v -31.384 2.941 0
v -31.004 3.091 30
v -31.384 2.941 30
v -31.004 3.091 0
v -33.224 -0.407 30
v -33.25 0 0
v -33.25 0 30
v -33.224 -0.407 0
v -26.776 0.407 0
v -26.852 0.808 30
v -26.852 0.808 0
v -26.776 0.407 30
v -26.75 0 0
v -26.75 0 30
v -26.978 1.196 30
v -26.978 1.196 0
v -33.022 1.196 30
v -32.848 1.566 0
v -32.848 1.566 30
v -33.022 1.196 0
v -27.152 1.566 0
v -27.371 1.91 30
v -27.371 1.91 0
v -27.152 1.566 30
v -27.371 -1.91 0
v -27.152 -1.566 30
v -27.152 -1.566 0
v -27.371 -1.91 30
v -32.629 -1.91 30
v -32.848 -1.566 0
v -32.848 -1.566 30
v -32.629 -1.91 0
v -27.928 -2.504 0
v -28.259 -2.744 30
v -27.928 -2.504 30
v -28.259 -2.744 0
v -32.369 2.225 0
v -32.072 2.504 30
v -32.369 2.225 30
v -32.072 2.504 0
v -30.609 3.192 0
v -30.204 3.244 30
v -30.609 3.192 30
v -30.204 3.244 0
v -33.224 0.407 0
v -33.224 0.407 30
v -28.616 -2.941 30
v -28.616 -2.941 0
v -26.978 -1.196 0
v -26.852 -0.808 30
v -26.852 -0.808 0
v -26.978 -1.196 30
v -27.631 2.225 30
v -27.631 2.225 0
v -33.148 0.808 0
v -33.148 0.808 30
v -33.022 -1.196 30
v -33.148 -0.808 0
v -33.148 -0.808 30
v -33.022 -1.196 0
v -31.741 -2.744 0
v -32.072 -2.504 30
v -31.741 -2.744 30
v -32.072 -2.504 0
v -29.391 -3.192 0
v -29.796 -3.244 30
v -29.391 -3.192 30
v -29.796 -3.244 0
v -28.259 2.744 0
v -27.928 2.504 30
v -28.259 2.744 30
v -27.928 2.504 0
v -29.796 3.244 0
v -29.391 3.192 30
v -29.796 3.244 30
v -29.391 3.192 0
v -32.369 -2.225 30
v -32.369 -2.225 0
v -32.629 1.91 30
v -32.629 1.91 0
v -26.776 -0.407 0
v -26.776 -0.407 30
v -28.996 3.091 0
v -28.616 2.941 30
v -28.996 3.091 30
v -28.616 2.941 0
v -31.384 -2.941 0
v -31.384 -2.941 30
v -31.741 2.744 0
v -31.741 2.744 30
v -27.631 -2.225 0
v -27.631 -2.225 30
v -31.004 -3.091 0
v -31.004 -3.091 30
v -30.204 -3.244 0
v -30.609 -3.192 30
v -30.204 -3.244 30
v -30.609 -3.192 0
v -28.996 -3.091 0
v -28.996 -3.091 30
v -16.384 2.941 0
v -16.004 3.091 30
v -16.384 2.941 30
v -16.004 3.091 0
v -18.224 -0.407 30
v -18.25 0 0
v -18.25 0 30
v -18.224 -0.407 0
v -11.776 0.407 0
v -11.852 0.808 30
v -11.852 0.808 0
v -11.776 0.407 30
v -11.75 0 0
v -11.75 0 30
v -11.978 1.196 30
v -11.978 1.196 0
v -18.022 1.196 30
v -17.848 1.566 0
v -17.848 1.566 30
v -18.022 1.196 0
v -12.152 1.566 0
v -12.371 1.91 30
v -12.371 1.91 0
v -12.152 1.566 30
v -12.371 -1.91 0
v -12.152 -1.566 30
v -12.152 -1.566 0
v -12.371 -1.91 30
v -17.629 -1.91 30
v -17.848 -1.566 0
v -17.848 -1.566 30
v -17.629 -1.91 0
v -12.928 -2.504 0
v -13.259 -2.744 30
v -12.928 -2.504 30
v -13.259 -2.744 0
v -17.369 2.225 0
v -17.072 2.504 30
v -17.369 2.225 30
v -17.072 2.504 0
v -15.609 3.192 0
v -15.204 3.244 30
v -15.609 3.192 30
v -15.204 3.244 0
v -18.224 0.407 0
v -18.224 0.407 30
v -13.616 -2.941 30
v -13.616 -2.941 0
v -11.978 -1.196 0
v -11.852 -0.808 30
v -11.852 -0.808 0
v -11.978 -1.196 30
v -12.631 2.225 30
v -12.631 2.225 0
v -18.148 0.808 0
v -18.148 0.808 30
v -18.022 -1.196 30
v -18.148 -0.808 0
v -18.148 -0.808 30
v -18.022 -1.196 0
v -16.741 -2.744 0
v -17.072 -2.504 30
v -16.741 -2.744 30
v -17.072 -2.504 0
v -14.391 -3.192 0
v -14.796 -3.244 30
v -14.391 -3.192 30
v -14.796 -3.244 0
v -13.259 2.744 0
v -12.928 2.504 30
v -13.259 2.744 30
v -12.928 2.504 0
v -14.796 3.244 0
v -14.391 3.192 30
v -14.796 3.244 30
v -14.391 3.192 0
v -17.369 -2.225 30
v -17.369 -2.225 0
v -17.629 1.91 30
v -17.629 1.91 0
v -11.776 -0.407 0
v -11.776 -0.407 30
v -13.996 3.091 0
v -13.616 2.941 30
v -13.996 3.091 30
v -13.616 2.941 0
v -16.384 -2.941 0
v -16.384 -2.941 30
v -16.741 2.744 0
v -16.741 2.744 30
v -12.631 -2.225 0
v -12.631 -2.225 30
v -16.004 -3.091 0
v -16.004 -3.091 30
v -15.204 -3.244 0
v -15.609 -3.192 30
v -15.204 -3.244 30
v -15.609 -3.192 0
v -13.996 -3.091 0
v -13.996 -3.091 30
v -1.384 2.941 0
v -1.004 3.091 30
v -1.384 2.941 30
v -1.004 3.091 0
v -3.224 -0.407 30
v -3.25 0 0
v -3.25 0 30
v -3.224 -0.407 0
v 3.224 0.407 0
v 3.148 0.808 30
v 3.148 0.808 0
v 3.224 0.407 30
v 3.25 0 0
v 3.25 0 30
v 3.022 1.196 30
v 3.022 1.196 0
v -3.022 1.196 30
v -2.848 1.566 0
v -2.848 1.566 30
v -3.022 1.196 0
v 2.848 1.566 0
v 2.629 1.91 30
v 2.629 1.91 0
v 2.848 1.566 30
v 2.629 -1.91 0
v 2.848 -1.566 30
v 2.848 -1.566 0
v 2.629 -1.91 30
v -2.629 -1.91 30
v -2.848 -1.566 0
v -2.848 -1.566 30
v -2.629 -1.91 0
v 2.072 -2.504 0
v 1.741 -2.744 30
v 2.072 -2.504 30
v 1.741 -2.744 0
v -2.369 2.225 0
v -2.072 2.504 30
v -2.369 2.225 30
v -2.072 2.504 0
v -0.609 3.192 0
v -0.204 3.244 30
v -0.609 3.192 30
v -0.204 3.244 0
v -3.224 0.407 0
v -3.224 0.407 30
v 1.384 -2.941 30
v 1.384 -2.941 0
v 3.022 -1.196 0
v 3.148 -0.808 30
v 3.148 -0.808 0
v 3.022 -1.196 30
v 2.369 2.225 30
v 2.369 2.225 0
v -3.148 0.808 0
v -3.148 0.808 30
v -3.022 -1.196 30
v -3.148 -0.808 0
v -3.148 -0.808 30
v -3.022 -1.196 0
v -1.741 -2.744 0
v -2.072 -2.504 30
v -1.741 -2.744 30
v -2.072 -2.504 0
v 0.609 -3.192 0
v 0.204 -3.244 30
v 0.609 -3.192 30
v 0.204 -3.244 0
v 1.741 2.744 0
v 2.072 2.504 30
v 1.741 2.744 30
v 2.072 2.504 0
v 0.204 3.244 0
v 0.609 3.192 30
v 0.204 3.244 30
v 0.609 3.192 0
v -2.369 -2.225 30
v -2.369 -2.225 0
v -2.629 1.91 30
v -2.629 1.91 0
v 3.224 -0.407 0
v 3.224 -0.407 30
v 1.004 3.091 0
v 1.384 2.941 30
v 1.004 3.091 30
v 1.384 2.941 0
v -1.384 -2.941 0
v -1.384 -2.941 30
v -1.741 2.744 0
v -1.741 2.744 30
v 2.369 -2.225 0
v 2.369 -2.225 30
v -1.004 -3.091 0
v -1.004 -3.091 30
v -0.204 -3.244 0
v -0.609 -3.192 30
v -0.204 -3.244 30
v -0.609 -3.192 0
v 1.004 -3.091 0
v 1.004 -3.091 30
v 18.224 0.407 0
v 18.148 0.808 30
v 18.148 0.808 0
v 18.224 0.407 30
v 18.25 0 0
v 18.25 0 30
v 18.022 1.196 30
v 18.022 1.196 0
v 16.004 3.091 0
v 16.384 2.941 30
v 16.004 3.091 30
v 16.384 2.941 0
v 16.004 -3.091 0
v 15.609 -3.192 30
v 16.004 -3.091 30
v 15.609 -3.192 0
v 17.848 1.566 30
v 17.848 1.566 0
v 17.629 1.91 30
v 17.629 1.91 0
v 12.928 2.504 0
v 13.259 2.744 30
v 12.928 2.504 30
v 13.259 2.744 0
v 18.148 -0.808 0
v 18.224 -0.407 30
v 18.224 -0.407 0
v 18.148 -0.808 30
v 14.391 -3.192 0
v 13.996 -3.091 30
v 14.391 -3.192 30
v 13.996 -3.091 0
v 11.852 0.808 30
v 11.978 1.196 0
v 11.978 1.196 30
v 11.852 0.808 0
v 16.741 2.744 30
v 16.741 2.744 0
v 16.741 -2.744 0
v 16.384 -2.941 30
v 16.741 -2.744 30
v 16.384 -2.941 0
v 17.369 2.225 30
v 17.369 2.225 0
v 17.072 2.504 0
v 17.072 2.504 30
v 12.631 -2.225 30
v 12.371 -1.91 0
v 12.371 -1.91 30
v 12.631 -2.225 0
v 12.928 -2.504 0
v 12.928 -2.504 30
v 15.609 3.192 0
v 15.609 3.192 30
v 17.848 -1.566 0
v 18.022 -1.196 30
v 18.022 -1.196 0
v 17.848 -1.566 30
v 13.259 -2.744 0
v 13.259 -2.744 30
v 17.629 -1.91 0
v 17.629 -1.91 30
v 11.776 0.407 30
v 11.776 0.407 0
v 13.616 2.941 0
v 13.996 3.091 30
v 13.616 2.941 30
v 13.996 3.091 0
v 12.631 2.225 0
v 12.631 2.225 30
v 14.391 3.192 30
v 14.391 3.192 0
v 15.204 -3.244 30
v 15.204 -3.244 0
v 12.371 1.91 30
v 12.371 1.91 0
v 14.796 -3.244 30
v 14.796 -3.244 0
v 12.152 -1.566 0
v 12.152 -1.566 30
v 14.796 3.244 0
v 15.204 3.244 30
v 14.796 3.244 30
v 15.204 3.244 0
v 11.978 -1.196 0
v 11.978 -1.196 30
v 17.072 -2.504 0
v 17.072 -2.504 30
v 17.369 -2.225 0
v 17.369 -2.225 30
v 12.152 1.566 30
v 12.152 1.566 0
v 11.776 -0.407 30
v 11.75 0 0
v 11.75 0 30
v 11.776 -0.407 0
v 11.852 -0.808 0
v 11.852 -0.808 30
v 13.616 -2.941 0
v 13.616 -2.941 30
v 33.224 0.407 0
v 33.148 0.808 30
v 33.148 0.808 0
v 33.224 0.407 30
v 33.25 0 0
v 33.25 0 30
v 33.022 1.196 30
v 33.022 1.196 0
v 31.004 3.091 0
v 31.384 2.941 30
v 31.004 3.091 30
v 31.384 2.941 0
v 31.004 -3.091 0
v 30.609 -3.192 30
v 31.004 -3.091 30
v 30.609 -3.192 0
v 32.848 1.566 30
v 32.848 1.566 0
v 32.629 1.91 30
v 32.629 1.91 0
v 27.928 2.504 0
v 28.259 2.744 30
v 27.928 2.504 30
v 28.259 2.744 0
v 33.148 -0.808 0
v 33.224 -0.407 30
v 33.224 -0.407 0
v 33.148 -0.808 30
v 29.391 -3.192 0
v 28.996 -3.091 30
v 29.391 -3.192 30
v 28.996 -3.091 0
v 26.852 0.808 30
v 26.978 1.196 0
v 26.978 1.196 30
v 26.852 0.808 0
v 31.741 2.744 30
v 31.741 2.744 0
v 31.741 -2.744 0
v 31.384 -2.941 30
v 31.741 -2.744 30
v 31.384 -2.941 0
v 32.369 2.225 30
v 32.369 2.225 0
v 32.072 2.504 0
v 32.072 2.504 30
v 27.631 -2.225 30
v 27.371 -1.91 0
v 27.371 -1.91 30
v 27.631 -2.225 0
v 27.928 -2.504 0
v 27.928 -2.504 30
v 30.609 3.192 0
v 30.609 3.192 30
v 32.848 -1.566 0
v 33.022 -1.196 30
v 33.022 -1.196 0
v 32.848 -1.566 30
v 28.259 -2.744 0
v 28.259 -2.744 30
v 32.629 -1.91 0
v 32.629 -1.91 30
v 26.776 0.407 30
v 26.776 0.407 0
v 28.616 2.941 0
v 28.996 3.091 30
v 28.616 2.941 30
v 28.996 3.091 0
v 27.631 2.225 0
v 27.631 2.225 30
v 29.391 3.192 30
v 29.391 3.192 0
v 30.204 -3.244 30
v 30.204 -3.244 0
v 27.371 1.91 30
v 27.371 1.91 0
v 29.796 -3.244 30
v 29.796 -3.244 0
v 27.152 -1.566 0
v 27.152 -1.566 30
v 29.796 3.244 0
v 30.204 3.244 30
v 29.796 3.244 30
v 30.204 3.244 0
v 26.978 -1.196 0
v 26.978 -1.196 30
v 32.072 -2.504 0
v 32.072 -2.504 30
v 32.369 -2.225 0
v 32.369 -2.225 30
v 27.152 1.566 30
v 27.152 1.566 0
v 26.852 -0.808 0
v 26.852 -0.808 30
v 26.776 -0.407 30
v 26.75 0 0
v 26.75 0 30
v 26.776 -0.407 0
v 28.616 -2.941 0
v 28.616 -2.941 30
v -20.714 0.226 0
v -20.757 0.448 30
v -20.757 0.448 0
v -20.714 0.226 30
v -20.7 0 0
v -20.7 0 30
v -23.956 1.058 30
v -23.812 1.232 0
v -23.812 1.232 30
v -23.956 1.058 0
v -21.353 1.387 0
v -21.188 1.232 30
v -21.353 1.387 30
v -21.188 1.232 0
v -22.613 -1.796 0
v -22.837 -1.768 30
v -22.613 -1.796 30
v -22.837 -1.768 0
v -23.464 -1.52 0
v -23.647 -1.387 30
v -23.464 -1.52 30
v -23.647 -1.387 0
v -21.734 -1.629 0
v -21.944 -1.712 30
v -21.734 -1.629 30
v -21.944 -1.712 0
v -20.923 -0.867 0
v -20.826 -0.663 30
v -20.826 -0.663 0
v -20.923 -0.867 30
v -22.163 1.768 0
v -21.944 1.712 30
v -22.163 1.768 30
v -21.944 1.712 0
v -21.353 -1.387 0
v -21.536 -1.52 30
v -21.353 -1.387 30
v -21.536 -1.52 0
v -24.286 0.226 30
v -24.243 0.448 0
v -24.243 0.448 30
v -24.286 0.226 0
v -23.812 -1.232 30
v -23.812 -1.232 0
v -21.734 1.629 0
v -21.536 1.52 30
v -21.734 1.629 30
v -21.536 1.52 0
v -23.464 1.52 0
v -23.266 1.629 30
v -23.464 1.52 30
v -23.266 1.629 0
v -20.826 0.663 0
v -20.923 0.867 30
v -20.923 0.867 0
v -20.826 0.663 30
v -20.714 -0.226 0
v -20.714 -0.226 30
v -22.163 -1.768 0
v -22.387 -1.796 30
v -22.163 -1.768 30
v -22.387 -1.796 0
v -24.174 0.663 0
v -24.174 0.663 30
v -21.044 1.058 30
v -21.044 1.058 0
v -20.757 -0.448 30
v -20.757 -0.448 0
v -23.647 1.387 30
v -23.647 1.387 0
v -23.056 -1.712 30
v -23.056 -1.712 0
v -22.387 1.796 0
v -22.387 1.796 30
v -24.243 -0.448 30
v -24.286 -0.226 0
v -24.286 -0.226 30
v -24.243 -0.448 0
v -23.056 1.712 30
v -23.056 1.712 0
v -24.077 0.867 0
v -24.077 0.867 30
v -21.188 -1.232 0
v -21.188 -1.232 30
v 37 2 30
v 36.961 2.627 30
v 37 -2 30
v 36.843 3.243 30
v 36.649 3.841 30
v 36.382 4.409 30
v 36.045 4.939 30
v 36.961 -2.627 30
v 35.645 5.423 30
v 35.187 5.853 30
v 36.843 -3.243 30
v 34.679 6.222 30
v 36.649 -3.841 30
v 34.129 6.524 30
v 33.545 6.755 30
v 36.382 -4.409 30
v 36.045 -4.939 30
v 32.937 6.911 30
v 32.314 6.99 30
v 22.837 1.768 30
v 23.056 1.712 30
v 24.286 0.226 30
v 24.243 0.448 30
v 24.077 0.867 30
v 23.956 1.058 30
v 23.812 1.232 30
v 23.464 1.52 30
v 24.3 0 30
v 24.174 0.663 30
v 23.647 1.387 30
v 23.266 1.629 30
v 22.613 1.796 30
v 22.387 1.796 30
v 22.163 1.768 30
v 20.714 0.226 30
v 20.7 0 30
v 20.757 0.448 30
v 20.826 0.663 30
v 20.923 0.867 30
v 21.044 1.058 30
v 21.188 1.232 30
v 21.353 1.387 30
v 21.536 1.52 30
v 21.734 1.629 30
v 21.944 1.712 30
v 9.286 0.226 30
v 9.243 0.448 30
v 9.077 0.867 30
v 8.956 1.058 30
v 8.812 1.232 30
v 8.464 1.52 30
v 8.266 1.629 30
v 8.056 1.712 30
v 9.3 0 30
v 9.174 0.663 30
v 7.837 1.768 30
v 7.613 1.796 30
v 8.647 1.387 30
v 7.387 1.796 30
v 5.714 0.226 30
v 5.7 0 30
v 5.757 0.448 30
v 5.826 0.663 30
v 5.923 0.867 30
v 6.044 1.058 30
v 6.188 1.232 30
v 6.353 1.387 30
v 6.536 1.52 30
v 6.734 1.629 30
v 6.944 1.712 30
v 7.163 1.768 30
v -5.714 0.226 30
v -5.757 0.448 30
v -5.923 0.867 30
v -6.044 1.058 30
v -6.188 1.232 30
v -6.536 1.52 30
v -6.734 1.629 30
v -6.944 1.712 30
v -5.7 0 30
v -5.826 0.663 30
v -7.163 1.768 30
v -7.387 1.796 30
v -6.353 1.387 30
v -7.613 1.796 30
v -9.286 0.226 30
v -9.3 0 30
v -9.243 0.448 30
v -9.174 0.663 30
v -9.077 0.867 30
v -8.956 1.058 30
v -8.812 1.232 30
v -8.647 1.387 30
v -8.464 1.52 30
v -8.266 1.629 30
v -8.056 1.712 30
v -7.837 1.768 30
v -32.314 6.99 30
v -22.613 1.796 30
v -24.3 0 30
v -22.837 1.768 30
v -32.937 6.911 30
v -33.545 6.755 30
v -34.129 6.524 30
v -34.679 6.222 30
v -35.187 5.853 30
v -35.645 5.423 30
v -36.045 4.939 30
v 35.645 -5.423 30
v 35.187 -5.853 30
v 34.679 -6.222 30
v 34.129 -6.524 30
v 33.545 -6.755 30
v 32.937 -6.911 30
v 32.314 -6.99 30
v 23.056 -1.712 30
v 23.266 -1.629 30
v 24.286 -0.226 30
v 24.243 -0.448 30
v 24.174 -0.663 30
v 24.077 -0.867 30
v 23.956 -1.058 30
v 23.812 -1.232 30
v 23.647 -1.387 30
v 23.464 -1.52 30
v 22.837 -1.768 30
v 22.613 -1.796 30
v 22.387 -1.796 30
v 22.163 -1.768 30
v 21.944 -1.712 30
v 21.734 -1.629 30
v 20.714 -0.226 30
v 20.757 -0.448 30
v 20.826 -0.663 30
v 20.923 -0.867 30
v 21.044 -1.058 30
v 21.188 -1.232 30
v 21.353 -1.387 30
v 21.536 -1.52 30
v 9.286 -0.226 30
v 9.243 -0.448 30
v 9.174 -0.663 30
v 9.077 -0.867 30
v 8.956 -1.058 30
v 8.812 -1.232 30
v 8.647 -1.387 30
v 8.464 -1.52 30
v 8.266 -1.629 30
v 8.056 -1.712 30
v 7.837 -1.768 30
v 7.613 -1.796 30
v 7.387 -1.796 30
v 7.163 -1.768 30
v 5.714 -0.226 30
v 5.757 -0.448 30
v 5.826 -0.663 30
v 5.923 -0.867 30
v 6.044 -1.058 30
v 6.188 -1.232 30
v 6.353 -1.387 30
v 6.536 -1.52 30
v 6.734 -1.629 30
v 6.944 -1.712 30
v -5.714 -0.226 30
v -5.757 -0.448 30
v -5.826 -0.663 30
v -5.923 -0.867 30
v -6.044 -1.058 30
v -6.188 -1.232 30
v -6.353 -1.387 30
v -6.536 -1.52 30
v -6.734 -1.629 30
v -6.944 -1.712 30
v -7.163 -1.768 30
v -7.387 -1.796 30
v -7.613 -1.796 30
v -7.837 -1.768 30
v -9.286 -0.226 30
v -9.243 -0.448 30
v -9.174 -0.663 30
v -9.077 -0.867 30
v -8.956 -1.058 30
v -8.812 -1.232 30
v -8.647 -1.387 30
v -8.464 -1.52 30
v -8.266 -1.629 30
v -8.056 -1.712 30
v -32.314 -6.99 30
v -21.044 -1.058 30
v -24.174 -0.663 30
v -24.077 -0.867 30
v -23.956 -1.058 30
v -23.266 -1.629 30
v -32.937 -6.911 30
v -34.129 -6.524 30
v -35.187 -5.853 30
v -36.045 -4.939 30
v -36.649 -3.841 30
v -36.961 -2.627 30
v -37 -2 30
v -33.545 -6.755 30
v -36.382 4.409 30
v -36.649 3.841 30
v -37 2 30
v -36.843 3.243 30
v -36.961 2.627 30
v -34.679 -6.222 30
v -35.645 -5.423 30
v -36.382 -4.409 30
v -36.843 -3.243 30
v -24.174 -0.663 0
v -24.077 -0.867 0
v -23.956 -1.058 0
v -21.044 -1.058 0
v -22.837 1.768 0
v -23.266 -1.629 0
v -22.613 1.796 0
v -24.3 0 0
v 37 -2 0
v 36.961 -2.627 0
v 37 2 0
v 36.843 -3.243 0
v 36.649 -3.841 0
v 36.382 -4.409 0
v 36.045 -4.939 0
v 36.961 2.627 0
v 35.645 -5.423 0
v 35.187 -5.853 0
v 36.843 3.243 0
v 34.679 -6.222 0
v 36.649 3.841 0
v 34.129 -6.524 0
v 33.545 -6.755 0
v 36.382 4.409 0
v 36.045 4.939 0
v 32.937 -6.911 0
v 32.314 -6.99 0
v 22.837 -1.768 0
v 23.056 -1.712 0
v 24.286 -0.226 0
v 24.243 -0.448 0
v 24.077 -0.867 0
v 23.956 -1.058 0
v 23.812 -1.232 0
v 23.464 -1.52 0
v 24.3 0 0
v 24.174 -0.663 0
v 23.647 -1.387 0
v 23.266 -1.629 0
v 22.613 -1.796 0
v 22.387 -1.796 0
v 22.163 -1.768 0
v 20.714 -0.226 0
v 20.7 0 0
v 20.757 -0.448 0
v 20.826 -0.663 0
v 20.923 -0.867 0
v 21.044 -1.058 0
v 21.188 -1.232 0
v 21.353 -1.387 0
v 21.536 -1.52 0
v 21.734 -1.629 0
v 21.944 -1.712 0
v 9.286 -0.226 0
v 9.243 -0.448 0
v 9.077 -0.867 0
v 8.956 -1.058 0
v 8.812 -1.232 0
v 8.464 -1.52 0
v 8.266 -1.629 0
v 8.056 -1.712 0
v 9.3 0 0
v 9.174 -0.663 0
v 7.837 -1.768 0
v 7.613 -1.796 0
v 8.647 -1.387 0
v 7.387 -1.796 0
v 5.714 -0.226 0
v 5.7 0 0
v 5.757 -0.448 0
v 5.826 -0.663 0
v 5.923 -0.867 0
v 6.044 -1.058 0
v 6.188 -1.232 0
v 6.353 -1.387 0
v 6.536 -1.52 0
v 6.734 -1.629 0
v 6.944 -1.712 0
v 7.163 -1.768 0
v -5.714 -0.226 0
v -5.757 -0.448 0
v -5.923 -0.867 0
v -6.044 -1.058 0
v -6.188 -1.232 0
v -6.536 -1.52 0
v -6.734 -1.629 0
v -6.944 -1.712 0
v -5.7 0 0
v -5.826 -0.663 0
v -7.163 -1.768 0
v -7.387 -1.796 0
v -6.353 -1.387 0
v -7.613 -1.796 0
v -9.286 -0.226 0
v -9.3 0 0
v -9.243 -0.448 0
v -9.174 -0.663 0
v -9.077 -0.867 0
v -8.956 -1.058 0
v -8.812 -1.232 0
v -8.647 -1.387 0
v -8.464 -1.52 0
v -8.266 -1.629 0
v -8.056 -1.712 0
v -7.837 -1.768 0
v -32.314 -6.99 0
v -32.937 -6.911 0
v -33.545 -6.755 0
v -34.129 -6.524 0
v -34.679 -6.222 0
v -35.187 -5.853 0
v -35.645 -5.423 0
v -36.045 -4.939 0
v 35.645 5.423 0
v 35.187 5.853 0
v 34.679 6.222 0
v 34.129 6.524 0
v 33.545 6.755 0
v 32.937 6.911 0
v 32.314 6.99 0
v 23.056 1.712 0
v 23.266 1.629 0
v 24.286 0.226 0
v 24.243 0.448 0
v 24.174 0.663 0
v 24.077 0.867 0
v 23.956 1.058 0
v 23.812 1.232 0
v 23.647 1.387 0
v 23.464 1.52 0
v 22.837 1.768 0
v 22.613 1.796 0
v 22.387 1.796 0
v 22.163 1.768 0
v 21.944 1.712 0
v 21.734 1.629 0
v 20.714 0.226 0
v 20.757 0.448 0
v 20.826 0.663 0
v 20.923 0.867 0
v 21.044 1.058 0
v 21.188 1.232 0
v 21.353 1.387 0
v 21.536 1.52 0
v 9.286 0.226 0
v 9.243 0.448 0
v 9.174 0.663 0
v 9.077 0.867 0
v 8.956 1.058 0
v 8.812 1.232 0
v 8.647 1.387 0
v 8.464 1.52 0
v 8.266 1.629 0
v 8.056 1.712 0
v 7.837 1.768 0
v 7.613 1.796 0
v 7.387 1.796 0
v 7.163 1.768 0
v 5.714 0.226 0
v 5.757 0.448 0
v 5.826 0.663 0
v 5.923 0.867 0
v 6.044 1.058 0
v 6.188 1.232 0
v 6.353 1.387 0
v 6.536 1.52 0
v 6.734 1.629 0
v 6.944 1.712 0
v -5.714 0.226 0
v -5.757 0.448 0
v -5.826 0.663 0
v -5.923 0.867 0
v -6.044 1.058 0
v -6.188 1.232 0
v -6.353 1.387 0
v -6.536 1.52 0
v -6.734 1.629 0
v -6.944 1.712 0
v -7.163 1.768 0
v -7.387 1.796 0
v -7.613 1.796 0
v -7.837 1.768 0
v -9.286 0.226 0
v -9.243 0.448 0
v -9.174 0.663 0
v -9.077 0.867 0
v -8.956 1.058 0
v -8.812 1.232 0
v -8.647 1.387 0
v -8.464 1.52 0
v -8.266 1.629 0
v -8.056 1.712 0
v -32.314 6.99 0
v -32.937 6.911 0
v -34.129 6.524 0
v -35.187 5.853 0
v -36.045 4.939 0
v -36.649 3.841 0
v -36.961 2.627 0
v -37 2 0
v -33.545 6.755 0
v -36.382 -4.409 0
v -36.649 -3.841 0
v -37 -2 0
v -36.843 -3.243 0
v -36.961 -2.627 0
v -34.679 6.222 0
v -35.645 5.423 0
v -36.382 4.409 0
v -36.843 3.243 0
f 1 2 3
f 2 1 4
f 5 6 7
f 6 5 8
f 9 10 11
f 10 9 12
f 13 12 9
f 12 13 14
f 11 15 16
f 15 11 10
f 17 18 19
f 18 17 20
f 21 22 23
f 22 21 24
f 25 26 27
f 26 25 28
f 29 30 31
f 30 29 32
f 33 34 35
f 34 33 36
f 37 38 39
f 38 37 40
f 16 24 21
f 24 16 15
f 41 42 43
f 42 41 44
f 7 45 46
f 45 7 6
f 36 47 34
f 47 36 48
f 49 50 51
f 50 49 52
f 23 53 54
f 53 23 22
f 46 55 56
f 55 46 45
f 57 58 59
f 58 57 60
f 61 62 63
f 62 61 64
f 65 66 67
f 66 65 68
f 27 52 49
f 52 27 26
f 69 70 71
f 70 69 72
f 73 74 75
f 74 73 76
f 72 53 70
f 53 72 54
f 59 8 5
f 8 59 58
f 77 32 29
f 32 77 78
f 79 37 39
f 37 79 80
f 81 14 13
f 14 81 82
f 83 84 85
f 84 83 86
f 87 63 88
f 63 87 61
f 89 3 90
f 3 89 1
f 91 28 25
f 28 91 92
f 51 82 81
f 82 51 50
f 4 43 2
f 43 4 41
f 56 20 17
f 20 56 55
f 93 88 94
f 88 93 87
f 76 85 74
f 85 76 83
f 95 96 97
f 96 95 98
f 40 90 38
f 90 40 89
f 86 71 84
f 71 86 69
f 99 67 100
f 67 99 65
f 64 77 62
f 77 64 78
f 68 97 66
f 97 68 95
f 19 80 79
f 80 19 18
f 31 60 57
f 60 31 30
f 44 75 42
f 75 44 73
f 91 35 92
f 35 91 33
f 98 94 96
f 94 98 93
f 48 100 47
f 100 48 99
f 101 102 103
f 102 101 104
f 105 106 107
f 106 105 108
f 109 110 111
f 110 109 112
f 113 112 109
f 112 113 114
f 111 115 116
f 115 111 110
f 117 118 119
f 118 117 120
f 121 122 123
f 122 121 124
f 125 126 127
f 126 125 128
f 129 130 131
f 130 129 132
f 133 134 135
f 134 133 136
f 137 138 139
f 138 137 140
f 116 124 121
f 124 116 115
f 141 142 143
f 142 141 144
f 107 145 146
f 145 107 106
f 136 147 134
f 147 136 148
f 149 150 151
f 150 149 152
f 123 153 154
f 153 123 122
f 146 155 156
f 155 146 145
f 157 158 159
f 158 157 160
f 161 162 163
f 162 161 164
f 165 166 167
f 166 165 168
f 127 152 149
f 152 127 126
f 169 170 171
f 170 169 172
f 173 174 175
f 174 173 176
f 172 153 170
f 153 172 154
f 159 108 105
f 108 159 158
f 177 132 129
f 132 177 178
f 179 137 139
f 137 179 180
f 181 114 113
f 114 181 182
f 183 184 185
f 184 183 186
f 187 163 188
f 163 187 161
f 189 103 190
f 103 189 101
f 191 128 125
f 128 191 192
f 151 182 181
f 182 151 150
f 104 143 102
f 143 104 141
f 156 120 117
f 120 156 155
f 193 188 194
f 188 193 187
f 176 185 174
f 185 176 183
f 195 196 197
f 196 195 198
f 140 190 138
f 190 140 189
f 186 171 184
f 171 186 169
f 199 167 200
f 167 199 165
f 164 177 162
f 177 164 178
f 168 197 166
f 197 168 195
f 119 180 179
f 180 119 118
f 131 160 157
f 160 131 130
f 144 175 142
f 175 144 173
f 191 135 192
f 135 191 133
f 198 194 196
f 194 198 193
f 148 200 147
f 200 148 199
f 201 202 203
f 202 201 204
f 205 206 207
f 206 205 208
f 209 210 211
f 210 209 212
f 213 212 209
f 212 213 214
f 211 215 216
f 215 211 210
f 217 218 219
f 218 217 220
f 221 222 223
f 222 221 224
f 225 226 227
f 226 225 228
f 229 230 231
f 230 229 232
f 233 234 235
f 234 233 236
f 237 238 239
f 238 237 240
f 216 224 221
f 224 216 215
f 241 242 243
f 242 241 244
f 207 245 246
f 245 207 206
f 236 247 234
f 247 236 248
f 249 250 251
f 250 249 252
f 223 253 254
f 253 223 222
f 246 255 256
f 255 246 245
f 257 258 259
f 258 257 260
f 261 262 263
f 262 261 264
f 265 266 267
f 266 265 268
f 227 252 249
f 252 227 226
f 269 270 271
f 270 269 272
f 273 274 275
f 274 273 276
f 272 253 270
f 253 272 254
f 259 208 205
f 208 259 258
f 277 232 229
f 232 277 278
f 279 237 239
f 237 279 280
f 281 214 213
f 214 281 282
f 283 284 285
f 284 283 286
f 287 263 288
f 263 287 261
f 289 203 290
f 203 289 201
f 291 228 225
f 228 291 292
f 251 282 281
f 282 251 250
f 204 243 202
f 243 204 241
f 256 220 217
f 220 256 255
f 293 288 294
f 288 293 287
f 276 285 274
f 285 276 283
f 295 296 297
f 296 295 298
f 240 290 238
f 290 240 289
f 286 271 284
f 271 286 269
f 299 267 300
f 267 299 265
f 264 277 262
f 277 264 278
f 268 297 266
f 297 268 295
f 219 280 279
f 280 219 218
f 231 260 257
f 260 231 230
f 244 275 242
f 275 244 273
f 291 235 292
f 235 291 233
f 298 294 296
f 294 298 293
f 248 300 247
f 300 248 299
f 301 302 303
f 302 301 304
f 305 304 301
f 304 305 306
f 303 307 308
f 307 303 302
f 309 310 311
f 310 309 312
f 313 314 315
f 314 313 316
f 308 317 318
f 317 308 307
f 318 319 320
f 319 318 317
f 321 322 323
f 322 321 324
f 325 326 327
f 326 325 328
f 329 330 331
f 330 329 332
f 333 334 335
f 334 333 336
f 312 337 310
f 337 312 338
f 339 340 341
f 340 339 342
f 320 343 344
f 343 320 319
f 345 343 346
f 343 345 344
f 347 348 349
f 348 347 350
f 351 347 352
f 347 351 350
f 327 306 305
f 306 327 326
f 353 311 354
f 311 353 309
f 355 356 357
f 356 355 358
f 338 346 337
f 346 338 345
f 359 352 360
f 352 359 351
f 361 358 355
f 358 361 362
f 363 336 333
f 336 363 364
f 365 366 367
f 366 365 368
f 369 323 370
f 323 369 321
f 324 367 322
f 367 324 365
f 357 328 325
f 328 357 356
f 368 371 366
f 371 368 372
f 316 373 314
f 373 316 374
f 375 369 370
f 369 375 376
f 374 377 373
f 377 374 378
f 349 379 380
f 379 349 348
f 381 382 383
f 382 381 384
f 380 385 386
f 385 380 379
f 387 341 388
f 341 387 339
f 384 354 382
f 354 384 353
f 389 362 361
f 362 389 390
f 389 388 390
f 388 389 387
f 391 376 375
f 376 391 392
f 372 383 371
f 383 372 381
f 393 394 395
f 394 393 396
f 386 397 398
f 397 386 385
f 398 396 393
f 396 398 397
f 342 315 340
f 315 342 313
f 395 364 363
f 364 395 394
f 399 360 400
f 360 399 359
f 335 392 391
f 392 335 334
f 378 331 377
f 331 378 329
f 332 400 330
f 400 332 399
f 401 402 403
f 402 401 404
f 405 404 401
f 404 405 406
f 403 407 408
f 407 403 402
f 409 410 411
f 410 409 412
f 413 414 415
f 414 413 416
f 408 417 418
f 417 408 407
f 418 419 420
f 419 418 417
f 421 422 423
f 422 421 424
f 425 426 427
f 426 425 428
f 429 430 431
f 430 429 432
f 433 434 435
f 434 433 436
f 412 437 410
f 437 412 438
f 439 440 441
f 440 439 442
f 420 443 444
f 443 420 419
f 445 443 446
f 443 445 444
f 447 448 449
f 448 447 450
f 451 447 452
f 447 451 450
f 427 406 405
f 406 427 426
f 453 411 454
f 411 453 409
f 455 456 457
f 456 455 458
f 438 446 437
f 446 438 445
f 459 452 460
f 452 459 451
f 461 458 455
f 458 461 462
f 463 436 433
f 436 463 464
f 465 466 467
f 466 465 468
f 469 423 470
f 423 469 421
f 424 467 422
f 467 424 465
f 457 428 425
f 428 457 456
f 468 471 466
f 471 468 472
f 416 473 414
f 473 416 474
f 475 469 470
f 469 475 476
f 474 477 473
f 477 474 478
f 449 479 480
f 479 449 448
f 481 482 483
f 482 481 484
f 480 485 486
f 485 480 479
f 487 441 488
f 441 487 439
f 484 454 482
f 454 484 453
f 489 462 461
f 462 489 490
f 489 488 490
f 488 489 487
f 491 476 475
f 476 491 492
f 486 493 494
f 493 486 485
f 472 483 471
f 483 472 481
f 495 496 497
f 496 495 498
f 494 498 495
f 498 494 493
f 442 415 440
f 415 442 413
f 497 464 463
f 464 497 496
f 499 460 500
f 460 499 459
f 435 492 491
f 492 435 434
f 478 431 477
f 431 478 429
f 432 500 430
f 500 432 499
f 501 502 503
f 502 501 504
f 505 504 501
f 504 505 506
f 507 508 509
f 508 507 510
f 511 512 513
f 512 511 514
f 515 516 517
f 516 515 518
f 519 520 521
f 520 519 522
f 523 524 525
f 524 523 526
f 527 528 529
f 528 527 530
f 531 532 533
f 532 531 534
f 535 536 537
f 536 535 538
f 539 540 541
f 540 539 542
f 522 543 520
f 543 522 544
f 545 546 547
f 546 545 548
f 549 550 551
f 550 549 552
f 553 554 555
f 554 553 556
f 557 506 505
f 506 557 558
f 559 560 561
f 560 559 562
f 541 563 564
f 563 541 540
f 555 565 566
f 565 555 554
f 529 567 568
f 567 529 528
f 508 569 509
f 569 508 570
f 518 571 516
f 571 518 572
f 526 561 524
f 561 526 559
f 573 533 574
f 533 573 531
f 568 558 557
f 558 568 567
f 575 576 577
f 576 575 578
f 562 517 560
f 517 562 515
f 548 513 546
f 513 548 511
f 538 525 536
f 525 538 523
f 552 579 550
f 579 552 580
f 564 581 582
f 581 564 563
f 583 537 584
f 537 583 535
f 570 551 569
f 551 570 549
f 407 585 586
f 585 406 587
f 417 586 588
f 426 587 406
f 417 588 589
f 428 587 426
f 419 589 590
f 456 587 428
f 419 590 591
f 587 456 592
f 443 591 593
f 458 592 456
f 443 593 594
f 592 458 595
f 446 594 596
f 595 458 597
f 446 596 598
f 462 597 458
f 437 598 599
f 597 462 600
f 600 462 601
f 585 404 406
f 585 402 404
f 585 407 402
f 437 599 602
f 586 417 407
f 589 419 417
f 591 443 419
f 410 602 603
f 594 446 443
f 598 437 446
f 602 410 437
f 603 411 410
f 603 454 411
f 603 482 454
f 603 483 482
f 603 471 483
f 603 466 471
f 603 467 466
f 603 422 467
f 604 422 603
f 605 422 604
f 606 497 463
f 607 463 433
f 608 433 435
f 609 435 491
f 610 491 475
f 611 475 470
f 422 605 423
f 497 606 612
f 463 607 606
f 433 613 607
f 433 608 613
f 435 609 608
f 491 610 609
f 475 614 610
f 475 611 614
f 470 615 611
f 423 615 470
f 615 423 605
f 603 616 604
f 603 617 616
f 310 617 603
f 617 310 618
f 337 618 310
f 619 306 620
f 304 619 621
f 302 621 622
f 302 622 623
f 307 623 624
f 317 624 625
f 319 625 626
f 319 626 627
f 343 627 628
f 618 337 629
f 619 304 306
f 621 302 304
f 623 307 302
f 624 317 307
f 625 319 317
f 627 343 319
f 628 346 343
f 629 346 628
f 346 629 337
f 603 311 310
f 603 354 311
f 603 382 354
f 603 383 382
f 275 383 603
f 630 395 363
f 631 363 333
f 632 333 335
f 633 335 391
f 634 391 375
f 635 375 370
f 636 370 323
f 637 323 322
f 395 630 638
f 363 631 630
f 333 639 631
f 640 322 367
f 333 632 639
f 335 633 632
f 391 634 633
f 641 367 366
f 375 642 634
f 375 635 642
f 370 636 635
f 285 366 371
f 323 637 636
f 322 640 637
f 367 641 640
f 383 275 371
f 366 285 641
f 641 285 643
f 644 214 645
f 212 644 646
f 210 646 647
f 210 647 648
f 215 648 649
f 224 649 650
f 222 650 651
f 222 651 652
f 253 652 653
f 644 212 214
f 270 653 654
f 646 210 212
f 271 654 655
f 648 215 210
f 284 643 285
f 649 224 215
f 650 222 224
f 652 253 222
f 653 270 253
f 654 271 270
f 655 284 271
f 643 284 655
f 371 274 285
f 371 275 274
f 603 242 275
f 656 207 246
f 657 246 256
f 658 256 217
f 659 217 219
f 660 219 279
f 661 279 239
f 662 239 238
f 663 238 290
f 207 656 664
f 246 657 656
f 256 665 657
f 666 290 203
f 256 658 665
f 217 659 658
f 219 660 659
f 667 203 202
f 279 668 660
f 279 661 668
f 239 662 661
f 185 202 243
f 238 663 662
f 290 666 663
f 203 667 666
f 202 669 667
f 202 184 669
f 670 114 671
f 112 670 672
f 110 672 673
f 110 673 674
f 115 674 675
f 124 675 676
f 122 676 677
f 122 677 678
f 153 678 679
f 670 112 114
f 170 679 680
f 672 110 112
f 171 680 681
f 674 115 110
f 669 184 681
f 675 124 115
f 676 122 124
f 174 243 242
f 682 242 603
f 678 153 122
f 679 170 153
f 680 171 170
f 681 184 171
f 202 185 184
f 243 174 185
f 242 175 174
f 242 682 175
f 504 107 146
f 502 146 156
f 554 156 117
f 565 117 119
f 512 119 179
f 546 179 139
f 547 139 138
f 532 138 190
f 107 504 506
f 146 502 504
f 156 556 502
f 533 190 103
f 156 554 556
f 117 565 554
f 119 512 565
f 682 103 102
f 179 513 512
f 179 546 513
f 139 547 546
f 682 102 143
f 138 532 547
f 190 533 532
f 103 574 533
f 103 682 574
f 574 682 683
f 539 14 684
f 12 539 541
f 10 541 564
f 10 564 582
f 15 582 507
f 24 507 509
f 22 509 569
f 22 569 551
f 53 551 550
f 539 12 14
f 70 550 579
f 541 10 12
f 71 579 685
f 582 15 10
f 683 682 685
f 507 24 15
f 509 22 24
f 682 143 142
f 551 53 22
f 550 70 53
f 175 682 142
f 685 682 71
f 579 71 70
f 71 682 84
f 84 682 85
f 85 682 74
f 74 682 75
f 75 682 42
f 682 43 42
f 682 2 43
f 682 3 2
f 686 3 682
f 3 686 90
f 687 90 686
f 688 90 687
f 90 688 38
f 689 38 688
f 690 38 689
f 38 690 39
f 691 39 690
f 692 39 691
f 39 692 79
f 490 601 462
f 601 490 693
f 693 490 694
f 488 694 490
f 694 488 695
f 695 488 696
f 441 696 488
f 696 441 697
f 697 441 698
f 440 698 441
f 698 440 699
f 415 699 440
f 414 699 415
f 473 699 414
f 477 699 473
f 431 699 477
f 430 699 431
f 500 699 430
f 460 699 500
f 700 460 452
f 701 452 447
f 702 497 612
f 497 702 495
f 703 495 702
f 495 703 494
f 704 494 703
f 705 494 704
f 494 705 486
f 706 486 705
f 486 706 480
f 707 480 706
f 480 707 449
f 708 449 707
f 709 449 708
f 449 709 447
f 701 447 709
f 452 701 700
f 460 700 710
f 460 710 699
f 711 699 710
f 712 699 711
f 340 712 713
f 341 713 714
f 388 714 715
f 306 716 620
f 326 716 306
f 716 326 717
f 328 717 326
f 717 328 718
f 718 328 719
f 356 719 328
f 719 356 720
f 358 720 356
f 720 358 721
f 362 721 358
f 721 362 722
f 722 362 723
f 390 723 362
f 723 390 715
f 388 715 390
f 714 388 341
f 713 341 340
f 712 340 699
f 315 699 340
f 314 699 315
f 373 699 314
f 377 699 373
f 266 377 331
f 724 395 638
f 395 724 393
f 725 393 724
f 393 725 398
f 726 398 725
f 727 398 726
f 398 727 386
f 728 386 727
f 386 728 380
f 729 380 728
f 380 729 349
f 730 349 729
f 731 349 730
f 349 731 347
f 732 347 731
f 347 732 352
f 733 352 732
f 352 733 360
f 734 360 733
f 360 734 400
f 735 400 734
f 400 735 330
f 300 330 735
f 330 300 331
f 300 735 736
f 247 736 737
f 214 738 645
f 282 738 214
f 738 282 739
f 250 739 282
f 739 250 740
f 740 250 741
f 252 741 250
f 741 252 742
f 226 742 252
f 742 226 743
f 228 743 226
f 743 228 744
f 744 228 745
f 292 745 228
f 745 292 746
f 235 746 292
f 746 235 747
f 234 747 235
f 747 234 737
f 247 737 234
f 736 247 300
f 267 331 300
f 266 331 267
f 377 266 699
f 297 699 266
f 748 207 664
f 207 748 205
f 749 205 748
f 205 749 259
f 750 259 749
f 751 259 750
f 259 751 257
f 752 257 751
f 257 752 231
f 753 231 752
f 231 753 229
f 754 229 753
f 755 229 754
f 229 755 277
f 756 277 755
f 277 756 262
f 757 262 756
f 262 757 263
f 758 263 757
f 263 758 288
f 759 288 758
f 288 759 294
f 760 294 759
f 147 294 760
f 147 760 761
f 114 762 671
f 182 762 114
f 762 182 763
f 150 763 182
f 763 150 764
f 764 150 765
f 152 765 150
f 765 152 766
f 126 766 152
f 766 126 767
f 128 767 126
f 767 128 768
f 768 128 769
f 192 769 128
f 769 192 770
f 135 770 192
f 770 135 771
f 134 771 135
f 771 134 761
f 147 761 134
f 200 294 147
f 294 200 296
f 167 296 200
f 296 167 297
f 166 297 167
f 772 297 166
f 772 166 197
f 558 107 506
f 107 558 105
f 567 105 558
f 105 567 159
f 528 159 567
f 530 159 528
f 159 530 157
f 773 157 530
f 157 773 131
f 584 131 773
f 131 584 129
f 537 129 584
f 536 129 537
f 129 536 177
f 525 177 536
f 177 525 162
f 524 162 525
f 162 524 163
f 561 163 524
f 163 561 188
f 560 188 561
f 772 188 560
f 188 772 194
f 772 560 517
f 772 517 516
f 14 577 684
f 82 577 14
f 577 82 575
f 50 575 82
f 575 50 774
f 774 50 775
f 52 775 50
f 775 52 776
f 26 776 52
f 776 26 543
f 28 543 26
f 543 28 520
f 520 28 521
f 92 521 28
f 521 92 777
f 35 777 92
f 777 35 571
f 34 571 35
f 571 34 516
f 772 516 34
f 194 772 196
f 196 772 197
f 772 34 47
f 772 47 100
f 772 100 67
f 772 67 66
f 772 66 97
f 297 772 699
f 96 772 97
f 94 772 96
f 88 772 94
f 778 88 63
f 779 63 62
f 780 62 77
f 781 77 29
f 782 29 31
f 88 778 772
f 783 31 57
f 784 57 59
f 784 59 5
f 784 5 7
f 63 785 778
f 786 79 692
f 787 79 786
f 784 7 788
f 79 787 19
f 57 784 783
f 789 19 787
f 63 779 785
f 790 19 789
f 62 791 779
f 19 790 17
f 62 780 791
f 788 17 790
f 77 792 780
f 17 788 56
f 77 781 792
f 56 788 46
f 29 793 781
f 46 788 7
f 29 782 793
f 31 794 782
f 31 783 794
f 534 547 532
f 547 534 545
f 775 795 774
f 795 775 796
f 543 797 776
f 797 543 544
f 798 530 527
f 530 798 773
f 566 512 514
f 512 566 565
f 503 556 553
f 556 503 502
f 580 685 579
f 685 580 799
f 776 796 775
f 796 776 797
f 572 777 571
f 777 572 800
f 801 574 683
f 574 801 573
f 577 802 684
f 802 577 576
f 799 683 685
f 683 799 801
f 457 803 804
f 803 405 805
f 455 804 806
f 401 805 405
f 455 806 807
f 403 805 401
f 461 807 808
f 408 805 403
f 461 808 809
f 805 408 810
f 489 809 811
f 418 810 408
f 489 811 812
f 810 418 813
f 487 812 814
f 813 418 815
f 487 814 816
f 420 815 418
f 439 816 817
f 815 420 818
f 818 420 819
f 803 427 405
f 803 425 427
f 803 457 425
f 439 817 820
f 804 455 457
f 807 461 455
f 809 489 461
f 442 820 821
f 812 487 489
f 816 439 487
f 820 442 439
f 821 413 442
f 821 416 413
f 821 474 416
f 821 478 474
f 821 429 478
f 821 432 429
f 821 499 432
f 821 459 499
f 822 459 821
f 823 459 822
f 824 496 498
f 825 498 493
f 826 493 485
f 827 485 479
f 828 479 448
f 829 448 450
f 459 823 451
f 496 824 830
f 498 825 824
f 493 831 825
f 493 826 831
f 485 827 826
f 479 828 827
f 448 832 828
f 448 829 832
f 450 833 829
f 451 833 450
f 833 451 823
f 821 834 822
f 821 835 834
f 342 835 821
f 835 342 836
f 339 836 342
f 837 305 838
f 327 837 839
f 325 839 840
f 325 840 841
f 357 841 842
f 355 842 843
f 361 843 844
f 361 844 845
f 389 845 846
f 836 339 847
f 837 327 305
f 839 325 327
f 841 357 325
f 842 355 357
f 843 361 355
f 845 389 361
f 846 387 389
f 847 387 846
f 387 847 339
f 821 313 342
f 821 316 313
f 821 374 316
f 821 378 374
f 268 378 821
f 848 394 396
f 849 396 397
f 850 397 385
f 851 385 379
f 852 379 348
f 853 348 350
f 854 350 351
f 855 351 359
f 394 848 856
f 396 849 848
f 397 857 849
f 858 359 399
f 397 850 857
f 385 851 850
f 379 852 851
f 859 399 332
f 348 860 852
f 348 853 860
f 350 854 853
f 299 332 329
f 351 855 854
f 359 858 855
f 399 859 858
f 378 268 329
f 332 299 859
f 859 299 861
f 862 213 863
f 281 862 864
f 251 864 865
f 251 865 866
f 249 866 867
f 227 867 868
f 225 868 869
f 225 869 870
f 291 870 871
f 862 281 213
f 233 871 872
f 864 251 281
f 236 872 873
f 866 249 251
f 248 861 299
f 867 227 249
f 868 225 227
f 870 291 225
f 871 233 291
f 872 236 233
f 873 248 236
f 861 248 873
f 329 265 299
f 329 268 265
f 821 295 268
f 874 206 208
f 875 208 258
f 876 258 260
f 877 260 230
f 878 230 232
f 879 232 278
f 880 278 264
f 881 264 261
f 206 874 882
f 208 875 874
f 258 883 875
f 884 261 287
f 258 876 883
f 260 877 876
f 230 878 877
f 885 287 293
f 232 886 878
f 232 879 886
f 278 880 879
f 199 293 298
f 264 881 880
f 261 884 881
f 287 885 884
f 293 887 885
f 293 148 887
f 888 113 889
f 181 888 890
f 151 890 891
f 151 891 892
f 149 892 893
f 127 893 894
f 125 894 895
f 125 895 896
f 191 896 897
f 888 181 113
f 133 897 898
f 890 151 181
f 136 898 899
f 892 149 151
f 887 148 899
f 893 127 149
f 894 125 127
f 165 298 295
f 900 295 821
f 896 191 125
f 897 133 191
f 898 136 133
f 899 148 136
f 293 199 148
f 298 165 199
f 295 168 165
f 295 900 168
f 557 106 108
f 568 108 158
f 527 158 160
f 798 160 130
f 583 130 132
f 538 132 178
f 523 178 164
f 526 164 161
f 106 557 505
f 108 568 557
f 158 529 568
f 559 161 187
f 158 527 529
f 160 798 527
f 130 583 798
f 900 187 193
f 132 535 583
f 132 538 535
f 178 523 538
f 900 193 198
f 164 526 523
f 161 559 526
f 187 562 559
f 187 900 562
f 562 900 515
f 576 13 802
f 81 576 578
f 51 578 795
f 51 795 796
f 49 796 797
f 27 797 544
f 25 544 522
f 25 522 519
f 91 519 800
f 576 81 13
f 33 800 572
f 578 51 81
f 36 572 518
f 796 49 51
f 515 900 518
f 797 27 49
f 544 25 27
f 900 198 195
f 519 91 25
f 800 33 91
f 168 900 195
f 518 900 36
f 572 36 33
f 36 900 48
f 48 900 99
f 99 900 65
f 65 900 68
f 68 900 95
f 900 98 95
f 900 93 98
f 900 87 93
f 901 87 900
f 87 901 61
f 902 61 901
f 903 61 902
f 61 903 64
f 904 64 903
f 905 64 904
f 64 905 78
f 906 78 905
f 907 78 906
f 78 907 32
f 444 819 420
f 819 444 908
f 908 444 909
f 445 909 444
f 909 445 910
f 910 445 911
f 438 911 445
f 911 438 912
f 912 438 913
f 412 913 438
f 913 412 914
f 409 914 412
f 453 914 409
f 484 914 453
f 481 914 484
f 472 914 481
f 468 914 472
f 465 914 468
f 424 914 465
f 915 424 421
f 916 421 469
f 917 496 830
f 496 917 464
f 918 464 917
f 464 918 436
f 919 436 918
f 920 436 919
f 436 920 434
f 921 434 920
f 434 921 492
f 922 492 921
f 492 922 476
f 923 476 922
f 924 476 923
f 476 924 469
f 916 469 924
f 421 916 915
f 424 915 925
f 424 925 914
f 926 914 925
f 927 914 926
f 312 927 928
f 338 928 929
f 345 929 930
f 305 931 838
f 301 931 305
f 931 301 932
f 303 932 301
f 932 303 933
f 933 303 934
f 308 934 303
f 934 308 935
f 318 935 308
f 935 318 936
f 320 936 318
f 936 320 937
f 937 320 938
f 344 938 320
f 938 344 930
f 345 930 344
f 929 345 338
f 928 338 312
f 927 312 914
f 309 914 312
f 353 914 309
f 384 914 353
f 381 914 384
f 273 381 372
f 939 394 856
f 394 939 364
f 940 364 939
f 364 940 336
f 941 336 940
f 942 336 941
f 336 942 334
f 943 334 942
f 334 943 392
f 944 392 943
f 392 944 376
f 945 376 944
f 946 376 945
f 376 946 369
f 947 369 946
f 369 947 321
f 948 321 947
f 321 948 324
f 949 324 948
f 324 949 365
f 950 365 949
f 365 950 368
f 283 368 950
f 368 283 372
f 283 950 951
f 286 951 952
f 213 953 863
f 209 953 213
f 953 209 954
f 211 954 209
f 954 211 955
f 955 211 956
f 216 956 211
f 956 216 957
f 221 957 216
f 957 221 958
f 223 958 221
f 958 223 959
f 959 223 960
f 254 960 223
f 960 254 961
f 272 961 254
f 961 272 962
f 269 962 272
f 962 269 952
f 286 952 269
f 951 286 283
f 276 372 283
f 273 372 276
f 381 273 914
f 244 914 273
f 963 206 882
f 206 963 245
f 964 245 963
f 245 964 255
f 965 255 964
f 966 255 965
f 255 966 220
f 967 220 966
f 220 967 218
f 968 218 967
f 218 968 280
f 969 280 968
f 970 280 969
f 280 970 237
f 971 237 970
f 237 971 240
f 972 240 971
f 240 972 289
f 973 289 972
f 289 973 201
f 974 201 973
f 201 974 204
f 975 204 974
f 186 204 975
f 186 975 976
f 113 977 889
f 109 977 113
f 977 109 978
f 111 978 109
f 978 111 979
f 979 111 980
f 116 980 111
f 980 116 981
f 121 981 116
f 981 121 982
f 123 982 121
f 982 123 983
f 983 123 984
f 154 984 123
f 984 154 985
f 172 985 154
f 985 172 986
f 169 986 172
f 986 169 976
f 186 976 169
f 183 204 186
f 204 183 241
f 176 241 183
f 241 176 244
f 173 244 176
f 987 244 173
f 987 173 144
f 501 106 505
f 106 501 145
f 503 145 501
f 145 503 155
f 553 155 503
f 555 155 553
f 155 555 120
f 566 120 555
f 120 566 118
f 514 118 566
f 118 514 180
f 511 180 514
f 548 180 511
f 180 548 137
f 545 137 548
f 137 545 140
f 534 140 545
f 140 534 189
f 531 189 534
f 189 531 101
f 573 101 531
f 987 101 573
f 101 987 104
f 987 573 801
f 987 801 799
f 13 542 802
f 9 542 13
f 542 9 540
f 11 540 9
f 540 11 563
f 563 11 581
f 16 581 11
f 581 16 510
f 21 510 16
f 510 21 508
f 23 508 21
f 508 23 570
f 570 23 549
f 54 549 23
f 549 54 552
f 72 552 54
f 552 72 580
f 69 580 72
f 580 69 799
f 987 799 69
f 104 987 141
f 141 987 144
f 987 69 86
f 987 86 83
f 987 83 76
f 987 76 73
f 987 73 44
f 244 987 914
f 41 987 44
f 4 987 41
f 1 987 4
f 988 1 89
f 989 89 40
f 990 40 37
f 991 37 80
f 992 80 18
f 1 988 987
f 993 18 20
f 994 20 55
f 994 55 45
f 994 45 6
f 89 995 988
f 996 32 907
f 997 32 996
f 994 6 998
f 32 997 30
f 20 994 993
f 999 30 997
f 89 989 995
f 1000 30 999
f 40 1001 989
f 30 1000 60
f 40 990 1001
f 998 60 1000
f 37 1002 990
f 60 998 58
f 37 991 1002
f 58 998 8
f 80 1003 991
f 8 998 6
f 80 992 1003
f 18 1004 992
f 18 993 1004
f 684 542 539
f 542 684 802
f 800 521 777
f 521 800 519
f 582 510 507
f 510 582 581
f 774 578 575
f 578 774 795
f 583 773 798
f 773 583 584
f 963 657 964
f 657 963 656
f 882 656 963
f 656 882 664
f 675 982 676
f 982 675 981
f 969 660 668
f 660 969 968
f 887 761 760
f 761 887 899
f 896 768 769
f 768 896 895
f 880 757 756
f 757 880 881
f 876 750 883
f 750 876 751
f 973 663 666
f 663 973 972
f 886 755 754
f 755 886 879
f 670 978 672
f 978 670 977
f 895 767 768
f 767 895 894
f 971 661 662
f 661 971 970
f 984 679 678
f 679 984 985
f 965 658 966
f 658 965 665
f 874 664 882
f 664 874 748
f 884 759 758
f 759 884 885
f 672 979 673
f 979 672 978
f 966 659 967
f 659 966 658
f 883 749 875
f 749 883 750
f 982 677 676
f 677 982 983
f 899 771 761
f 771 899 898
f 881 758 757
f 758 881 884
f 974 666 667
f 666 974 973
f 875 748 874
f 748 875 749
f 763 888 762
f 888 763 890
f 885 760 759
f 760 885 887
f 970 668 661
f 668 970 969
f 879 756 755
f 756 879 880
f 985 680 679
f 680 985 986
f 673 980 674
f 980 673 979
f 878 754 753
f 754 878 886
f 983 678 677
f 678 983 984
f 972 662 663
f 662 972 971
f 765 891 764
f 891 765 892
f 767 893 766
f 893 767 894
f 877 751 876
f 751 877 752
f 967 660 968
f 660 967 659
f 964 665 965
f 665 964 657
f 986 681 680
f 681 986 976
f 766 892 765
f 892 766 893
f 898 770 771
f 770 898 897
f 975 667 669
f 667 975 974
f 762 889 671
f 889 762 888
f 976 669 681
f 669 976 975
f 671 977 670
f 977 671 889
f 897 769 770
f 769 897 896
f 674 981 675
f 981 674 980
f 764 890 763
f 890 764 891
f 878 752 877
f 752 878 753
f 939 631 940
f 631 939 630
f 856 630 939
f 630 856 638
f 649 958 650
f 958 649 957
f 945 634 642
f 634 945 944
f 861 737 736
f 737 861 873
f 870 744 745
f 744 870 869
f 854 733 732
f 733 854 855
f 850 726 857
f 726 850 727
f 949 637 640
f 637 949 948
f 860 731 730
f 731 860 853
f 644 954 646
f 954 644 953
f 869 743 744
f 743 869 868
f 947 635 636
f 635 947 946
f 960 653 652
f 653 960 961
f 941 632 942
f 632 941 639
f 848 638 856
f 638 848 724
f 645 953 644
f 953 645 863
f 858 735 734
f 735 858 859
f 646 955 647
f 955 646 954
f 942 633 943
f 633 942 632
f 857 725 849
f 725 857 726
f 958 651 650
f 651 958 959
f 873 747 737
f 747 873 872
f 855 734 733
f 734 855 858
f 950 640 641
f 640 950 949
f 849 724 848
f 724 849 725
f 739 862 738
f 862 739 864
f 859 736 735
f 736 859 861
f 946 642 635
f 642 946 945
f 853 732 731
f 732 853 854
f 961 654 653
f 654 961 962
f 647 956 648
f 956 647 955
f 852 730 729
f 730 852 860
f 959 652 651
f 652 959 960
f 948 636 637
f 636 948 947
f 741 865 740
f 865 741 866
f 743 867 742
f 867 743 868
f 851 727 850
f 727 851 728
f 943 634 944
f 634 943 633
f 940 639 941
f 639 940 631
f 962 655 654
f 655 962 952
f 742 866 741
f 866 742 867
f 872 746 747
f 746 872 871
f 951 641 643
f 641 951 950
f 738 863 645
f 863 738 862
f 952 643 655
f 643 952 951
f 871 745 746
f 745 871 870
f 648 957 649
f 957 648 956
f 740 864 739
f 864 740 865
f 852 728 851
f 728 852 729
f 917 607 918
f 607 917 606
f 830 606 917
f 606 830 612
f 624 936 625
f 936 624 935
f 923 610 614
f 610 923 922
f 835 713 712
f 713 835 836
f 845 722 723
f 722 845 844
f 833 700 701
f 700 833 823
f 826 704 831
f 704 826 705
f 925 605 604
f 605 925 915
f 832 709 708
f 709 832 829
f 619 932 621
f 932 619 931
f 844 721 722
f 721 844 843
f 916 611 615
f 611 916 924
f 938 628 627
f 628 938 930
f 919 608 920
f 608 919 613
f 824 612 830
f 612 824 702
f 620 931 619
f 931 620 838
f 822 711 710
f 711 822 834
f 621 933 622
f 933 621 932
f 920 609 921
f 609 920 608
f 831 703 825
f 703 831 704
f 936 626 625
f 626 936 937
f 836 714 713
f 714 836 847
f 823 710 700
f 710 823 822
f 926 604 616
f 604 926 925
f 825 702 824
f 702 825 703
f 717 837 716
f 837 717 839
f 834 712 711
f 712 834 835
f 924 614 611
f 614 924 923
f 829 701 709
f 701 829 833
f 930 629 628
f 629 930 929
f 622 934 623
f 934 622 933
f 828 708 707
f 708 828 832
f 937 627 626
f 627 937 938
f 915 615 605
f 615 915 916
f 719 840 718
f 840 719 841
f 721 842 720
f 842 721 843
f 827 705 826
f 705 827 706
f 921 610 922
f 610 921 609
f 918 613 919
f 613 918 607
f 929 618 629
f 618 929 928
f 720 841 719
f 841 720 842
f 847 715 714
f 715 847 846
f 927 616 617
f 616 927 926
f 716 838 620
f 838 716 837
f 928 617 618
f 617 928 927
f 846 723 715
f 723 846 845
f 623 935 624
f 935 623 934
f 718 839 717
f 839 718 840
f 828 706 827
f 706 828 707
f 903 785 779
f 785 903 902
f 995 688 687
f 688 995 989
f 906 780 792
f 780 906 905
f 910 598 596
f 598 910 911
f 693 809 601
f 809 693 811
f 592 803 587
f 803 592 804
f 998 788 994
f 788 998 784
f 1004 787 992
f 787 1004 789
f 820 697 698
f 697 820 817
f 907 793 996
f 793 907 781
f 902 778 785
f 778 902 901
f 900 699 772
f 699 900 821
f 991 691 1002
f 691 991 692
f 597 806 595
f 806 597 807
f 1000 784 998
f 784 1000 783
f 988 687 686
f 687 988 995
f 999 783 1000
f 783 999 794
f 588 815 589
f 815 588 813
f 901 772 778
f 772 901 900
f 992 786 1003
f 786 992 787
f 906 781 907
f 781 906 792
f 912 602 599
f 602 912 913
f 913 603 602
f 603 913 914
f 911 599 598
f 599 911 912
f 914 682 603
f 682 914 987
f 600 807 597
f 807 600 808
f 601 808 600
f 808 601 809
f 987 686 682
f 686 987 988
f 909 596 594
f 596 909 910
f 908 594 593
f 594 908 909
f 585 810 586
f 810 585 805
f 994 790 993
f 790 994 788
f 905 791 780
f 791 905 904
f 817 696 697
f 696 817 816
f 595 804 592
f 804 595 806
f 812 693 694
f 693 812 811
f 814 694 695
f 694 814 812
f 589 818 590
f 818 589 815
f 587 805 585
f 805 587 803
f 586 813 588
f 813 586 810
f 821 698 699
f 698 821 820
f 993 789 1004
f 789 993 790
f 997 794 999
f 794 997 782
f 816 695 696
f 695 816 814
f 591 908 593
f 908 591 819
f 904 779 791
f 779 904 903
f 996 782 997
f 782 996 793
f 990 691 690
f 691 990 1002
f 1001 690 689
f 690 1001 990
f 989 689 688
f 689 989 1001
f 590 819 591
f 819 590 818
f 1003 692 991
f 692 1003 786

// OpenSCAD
$fn = 50;


difference() {
	union() {
		hull() {
			translate(v = [-32.0000000000, 2.0000000000, 0]) {
				cylinder(h = 30, r = 5);
			}
			translate(v = [32.0000000000, 2.0000000000, 0]) {
				cylinder(h = 30, r = 5);
			}
			translate(v = [-32.0000000000, -2.0000000000, 0]) {
				cylinder(h = 30, r = 5);
			}
			translate(v = [32.0000000000, -2.0000000000, 0]) {
				cylinder(h = 30, r = 5);
			}
		}
	}
	union() {
		translate(v = [-30.0000000000, 0.0000000000, -100.0000000000]) {
			cylinder(h = 200, r = 3.2500000000);
		}
		translate(v = [-15.0000000000, 0.0000000000, -100.0000000000]) {
			cylinder(h = 200, r = 3.2500000000);
		}
		translate(v = [0.0000000000, 0.0000000000, -100.0000000000]) {
			cylinder(h = 200, r = 3.2500000000);
		}
		translate(v = [15.0000000000, 0.0000000000, -100.0000000000]) {
			cylinder(h = 200, r = 3.2500000000);
		}
		translate(v = [30.0000000000, 0.0000000000, -100.0000000000]) {
			cylinder(h = 200, r = 3.2500000000);
		}
		translate(v = [-30.0000000000, 0.0000000000, 0]) {
			cylinder(h = 30, r = 1.8000000000);
		}
		translate(v = [-22.5000000000, 0.0000000000, 0]) {
			cylinder(h = 30, r = 1.8000000000);
		}
		translate(v = [-15.0000000000, 0.0000000000, 0]) {
			cylinder(h = 30, r = 1.8000000000);
		}
		translate(v = [-7.5000000000, 0.0000000000, 0]) {
			cylinder(h = 30, r = 1.8000000000);
		}
		cylinder(h = 30, r = 1.8000000000);
		translate(v = [7.5000000000, 0.0000000000, 0]) {
			cylinder(h = 30, r = 1.8000000000);
		}
		translate(v = [15.0000000000, 0.0000000000, 0]) {
			cylinder(h = 30, r = 1.8000000000);
		}
		translate(v = [22.5000000000, 0.0000000000, 0]) {
			cylinder(h = 30, r = 1.8000000000);
		}
		translate(v = [30.0000000000, 0.0000000000, 0]) {
			cylinder(h = 30, r = 1.8000000000);
		}
		translate(v = [-30.0000000000, 0.0000000000, 0]) {
			cylinder(h = 30, r = 1.8000000000);
		}
		translate(v = [-22.5000000000, 0.0000000000, 0]) {
			cylinder(h = 30, r = 1.8000000000);
		}
		translate(v = [-15.0000000000, 0.0000000000, 0]) {
			cylinder(h = 30, r = 1.8000000000);
		}
		translate(v = [-7.5000000000, 0.0000000000, 0]) {
			cylinder(h = 30, r = 1.8000000000);
		}
		cylinder(h = 30, r = 1.8000000000);
		translate(v = [7.5000000000, 0.0000000000, 0]) {
			cylinder(h = 30, r = 1.8000000000);
		}
		translate(v = [15.0000000000, 0.0000000000, 0]) {
			cylinder(h = 30, r = 1.8000000000);
		}
		translate(v = [22.5000000000, 0.0000000000, 0]) {
			cylinder(h = 30, r = 1.8000000000);
		}
		translate(v = [30.0000000000, 0.0000000000, 0]) {
			cylinder(h = 30, r = 1.8000000000);
		}
		translate(v = [-30.0000000000, 0.0000000000, 0]) {
			cylinder(h = 30, r = 1.8000000000);
		}
		translate(v = [-22.5000000000, 0.0000000000, 0]) {
			cylinder(h = 30, r = 1.8000000000);
		}
		translate(v = [-15.0000000000, 0.0000000000, 0]) {
			cylinder(h = 30, r = 1.8000000000);
		}
		translate(v = [-7.5000000000, 0.0000000000, 0]) {
			cylinder(h = 30, r = 1.8000000000);
		}
		cylinder(h = 30, r = 1.8000000000);
		translate(v = [7.5000000000, 0.0000000000, 0]) {
			cylinder(h = 30, r = 1.8000000000);
		}
		translate(v = [15.0000000000, 0.0000000000, 0]) {
			cylinder(h = 30, r = 1.8000000000);
		}
		translate(v = [22.5000000000, 0.0000000000, 0]) {
			cylinder(h = 30, r = 1.8000000000);
		}
		translate(v = [30.0000000000, 0.0000000000, 0]) {
			cylinder(h = 30, r = 1.8000000000);
		}
	}
}
